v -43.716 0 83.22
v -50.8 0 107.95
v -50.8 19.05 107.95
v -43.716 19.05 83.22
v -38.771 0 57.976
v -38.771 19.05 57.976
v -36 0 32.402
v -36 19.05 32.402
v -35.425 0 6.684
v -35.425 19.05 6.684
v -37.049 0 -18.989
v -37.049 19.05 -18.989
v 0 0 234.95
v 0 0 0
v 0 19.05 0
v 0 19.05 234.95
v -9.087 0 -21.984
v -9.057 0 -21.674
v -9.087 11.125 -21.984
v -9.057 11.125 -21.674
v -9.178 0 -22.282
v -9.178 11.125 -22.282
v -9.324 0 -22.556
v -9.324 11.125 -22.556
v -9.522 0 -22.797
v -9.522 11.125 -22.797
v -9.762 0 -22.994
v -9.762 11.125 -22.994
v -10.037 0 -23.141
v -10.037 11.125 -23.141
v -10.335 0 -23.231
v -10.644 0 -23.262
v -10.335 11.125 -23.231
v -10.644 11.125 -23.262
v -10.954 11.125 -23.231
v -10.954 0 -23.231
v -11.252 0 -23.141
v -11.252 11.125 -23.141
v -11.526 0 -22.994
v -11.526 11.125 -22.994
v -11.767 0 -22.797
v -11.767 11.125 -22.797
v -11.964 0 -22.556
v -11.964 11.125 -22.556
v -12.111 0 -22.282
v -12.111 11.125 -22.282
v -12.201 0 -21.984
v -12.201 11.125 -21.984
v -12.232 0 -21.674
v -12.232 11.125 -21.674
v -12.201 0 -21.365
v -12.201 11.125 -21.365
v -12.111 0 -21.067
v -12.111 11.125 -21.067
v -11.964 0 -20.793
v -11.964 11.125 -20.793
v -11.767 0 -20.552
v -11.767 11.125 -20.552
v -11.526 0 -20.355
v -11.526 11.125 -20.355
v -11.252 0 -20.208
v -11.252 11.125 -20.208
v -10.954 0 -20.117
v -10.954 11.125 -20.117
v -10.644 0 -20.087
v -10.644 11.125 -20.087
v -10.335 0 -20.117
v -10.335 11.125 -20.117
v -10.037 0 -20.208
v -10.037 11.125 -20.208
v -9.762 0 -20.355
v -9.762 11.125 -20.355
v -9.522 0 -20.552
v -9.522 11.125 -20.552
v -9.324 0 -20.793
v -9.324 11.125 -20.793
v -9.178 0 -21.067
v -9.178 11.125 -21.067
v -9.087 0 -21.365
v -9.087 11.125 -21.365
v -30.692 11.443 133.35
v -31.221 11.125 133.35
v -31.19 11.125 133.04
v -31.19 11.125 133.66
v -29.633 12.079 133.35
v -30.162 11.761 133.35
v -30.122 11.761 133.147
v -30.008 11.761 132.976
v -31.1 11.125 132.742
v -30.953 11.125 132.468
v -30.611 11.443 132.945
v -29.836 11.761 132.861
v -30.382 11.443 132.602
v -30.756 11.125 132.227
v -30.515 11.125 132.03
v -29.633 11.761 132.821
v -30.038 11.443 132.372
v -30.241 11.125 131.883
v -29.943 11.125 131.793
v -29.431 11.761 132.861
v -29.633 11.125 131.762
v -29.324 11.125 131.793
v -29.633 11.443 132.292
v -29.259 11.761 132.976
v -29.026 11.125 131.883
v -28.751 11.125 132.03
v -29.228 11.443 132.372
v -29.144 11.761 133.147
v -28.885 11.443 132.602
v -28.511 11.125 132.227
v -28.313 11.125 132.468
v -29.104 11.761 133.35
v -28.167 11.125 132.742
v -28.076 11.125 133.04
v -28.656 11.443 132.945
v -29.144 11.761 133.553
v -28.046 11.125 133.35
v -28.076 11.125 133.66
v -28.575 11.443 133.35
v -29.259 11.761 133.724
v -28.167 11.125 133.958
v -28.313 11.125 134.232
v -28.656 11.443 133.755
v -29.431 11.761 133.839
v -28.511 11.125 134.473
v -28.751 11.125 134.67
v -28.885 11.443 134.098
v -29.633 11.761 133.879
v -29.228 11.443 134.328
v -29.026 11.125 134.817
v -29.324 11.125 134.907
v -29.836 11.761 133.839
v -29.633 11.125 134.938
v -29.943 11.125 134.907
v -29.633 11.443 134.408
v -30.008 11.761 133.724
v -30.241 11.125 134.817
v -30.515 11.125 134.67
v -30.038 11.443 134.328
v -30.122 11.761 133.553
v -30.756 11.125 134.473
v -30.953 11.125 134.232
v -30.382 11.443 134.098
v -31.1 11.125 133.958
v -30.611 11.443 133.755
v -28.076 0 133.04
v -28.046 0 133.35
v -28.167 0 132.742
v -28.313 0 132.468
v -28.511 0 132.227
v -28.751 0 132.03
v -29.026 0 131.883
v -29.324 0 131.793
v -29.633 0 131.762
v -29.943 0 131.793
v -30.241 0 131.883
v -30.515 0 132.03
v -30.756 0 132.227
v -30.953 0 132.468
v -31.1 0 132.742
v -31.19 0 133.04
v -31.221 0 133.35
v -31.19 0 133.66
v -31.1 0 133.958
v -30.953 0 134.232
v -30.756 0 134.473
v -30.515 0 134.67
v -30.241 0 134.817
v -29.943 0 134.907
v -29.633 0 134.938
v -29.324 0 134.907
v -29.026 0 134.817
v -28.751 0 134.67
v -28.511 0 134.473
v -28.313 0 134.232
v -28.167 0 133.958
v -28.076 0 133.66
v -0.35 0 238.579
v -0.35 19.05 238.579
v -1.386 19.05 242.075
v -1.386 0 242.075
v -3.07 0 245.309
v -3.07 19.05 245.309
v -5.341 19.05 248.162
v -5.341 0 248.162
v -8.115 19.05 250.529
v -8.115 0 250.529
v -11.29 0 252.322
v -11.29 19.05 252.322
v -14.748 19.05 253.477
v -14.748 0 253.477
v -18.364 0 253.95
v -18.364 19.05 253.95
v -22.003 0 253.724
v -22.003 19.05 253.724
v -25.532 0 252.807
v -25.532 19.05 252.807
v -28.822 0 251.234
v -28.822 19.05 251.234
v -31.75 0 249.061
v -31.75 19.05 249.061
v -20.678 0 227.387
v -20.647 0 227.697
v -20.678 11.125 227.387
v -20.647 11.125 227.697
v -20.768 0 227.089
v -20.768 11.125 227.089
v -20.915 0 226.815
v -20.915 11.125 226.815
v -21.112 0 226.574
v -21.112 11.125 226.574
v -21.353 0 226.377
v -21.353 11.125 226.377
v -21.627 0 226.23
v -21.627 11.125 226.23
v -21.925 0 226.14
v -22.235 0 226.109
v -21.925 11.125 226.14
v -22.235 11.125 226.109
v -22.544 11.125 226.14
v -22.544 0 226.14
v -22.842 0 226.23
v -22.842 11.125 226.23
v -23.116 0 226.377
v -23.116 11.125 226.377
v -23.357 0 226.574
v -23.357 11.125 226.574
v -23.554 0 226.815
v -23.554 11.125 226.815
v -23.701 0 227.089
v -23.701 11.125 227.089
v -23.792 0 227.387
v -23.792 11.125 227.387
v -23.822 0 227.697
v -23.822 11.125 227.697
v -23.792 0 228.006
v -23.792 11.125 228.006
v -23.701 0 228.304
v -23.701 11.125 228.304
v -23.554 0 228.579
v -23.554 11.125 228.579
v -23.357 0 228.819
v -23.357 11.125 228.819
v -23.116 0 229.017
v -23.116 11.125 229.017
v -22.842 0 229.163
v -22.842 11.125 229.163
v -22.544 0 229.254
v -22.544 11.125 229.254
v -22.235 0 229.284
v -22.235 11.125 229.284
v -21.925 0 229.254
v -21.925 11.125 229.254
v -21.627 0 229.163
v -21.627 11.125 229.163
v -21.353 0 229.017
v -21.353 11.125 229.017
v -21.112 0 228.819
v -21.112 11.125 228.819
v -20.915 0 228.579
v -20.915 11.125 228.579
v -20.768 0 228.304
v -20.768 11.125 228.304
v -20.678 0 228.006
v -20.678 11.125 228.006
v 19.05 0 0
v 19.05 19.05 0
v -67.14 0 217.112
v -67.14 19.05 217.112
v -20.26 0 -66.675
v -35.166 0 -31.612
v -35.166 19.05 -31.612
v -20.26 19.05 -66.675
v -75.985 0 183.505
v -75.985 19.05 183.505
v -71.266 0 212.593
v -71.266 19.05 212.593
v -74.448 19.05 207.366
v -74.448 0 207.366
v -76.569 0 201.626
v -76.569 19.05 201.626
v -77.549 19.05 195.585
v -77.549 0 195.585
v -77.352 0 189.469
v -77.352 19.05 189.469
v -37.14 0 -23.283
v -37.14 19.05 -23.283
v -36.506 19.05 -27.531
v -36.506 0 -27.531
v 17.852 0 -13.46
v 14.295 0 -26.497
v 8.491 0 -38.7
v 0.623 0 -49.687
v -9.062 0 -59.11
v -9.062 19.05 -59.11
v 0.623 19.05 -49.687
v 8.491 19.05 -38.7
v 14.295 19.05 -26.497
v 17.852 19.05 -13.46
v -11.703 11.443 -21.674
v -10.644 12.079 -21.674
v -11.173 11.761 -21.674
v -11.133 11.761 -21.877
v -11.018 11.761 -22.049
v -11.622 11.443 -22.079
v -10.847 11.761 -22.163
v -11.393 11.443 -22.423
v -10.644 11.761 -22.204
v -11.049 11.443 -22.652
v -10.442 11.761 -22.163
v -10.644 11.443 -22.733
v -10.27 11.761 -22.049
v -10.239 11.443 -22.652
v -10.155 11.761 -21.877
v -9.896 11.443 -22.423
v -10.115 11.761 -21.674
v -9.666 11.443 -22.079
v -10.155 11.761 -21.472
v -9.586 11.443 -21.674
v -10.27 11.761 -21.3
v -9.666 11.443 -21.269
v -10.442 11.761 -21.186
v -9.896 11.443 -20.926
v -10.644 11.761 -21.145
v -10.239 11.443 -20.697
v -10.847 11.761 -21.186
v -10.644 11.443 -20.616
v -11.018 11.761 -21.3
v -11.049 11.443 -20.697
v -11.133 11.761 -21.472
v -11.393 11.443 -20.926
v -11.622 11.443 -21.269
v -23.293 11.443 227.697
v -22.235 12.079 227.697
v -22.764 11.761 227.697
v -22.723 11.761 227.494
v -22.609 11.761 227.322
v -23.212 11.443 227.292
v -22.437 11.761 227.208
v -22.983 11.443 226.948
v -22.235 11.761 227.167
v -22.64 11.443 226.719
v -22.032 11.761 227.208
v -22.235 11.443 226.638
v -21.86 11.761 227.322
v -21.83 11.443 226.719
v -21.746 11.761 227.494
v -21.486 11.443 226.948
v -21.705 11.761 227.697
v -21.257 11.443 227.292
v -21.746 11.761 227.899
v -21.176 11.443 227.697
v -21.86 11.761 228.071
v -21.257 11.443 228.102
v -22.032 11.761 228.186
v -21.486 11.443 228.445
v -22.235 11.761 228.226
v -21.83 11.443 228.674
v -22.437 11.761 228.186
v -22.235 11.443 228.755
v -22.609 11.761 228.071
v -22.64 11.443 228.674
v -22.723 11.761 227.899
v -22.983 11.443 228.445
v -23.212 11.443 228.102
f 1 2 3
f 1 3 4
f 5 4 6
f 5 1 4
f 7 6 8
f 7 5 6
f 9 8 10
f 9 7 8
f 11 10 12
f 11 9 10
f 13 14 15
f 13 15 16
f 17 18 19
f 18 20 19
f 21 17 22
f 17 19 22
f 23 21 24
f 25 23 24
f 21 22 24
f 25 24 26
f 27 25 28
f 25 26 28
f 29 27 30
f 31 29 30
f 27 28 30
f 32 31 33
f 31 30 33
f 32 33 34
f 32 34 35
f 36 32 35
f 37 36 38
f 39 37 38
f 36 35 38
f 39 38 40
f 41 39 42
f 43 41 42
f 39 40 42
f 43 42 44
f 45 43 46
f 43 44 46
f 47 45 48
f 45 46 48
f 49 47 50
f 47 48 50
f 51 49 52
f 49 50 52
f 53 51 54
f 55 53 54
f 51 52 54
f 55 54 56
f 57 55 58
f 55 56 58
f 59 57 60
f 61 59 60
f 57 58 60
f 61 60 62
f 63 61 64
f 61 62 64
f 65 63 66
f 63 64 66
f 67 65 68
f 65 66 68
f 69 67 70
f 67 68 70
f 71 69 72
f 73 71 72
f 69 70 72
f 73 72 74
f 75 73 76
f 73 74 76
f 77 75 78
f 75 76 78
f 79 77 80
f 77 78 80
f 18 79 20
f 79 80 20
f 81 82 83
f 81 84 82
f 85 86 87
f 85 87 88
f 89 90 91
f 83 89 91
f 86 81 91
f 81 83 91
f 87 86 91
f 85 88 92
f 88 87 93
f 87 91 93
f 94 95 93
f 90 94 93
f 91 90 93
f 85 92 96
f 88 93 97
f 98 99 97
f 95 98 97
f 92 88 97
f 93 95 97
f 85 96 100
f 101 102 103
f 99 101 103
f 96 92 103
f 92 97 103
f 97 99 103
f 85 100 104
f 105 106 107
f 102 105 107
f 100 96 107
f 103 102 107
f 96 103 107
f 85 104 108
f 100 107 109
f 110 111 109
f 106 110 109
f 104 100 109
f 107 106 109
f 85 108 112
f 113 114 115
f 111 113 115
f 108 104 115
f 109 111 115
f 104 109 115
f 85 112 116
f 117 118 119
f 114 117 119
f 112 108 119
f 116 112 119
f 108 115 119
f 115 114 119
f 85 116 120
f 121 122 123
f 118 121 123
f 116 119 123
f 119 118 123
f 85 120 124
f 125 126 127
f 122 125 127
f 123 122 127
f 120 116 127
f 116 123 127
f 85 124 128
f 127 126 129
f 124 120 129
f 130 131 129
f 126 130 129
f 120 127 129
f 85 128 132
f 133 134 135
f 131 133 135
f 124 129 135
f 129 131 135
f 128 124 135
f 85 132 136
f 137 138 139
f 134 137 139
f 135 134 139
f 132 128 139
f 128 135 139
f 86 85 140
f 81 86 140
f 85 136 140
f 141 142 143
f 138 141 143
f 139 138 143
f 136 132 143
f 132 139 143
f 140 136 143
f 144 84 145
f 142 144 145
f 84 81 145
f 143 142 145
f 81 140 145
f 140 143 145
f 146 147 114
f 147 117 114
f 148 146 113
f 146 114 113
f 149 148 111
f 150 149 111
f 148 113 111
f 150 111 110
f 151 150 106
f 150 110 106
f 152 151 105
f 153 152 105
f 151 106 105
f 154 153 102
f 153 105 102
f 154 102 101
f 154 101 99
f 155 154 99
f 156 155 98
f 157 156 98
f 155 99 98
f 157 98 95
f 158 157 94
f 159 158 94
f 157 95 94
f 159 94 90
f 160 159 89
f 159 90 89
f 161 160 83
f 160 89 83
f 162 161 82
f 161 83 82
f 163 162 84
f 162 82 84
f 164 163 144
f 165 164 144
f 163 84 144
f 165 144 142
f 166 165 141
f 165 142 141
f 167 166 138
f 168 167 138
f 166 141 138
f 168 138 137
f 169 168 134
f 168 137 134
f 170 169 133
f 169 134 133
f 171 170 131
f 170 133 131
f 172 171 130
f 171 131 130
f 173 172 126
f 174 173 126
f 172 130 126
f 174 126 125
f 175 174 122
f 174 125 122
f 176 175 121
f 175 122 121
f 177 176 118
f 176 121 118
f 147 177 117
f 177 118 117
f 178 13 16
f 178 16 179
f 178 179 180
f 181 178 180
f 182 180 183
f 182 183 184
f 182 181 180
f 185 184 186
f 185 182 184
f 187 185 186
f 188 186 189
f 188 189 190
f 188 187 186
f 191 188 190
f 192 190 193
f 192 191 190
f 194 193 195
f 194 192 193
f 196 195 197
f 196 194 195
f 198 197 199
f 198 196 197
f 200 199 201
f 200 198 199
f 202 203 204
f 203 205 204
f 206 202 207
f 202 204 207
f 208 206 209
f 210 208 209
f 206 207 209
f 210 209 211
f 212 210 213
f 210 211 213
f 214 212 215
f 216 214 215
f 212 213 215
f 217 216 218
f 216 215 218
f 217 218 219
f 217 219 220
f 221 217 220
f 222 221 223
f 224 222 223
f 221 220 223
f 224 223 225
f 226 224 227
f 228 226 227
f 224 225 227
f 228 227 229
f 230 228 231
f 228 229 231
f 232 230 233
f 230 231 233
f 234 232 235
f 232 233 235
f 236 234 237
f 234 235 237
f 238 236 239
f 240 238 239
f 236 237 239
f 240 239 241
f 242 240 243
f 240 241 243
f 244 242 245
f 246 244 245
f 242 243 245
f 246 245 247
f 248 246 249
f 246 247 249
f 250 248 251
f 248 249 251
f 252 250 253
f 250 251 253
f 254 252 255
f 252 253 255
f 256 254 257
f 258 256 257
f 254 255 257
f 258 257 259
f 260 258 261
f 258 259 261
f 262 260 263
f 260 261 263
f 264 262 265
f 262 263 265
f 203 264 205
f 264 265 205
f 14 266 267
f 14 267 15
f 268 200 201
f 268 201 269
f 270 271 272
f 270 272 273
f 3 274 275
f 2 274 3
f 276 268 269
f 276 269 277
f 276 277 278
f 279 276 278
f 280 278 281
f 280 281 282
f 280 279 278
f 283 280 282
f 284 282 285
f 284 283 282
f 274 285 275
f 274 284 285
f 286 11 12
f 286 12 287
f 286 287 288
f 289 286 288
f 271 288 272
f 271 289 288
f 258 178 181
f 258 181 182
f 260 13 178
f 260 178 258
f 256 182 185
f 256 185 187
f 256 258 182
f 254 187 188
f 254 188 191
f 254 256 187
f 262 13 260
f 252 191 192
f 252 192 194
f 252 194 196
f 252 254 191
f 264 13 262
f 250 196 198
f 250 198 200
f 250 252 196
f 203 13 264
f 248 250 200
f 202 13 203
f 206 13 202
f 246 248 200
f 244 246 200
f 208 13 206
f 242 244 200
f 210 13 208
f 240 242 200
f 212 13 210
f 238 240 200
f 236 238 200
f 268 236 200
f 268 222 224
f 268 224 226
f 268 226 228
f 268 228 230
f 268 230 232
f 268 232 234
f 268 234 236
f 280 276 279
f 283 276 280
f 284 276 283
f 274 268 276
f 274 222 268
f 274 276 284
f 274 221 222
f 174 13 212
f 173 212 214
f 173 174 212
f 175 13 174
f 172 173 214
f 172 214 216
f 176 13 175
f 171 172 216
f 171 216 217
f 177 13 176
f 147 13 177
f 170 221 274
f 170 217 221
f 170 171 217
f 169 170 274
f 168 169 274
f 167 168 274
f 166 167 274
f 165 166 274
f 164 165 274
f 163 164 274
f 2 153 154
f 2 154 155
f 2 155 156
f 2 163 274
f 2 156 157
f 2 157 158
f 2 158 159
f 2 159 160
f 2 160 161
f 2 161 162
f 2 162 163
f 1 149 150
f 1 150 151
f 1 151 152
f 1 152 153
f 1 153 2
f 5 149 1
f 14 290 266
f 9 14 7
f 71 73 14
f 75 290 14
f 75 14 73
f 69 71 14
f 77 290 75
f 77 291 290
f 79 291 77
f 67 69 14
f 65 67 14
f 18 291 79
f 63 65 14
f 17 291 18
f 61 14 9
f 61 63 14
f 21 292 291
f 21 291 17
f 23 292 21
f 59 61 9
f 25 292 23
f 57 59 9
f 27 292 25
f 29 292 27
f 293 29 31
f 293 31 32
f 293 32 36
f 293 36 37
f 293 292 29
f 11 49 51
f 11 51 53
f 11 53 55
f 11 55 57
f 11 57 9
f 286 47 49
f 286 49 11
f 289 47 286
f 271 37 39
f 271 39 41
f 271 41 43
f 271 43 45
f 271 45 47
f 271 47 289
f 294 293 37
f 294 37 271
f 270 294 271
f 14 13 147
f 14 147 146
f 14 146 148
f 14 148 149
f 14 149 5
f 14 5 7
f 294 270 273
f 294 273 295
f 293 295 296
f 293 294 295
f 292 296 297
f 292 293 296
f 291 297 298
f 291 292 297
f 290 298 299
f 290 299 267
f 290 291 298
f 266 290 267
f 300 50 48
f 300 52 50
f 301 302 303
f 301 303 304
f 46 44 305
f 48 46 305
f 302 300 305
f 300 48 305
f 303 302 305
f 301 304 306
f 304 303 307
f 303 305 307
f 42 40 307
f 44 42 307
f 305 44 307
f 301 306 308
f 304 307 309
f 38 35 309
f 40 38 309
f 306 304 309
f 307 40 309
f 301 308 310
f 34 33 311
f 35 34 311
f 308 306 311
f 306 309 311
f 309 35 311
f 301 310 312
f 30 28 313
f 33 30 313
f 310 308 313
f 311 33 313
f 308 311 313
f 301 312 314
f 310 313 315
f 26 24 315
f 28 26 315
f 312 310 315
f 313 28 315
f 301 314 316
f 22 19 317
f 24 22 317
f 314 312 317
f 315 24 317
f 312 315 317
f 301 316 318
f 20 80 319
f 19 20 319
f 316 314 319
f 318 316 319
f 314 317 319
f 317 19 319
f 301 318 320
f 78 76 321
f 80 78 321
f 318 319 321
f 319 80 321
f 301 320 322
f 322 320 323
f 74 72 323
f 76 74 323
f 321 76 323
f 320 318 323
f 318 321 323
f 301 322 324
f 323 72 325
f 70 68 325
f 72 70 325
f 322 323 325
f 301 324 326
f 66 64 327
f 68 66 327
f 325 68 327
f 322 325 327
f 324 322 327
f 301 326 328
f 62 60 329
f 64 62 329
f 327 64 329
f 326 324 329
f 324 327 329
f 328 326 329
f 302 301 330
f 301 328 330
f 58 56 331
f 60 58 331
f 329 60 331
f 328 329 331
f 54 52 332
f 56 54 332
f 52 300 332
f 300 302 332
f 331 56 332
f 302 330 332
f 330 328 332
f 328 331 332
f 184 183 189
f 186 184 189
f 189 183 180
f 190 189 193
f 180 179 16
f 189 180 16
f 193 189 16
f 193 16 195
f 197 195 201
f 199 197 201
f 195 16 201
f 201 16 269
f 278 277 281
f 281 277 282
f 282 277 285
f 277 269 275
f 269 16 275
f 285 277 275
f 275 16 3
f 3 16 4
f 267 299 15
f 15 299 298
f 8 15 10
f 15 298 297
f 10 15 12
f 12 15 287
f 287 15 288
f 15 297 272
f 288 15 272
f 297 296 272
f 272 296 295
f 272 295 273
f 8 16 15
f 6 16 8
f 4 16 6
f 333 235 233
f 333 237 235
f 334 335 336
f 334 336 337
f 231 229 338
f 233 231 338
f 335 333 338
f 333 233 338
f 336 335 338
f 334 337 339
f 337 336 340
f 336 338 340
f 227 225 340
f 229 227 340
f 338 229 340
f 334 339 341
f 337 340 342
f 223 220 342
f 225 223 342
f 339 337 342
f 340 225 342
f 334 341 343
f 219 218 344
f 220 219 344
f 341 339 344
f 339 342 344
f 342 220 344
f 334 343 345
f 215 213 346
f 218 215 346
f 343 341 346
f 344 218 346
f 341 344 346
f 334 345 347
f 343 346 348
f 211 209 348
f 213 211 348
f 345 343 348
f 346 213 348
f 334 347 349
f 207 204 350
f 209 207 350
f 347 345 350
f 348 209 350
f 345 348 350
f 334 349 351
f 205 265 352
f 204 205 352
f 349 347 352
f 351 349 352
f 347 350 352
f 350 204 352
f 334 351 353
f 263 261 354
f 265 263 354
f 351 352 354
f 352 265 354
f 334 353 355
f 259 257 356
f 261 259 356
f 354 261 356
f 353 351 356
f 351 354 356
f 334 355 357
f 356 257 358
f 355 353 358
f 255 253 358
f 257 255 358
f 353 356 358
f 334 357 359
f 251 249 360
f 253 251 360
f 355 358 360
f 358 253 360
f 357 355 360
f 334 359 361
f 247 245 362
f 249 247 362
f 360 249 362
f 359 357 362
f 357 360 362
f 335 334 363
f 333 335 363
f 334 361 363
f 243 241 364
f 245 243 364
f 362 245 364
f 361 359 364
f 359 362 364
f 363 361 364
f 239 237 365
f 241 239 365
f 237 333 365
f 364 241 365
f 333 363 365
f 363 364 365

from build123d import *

# Parameters (mm, degrees)
BOSS_EXTRUDE1_DEPTH              = 19.05
F_1_8_0_125_DIAMETER_HOLE1_D     = 3.175
F_1_8_0_125_DIAMETER_HOLE1_DEPTH = 11.1252
F_1_8_0_125_DIAMETER_HOLE1_TIP   = 0.953866233


with BuildPart() as part:
    # Sketch1 → Boss-Extrude1 (new body)
    with BuildSketch(Plane(origin=(0, 0, 0), x_dir=(1, 0, 0), z_dir=(0, 1, 0))):
        with BuildLine():
            Line((0, 0), (0, -234.95))
            ThreePointArc((0, -234.95), (-11.289784316, -252.322290845), (-31.75, -249.061111111))
            Line((-31.75, -249.061111111), (-67.13994853, -217.111852022))
            ThreePointArc((-67.13994853, -217.111852022), (-76.568587152, -201.625781937), (-75.984870047, -183.504610141))
            Line((-75.984870047, -183.504610141), (-50.8, -107.95))
            ThreePointArc((-50.8, -107.95), (-37.112138852, -45.218522559), (-37.04854536, 18.988889479))
            ThreePointArc((-37.04854536, 18.988889479), (-36.913147406, 25.420628086), (-35.166213845, 31.612059039))
            Line((-35.166213845, 31.612059039), (-20.259833627, 66.675))
            ThreePointArc((-20.259833627, 66.675), (8.490957784, 38.700189421), (19.05, 0))
            Line((19.05, 0), (0, 0))
        make_face()
    extrude(amount=BOSS_EXTRUDE1_DEPTH)

    # 1/8 (0.125) Diameter Hole1
    with Locations(Plane(origin=(0, 0, 0), x_dir=(-1, 0, 0), z_dir=(0, -1, 0))):
        with Locations((10.644245878, 21.674472227), (29.633333333, -133.35), (22.234526543, -227.696620833)):
            Hole(F_1_8_0_125_DIAMETER_HOLE1_D / 2, depth=F_1_8_0_125_DIAMETER_HOLE1_DEPTH)
            with Locations((0, 0, -(F_1_8_0_125_DIAMETER_HOLE1_DEPTH + F_1_8_0_125_DIAMETER_HOLE1_TIP / 2))):  # 118° drill point
                Cone(0, F_1_8_0_125_DIAMETER_HOLE1_D / 2, F_1_8_0_125_DIAMETER_HOLE1_TIP, mode=Mode.SUBTRACT)


solid = part.part
